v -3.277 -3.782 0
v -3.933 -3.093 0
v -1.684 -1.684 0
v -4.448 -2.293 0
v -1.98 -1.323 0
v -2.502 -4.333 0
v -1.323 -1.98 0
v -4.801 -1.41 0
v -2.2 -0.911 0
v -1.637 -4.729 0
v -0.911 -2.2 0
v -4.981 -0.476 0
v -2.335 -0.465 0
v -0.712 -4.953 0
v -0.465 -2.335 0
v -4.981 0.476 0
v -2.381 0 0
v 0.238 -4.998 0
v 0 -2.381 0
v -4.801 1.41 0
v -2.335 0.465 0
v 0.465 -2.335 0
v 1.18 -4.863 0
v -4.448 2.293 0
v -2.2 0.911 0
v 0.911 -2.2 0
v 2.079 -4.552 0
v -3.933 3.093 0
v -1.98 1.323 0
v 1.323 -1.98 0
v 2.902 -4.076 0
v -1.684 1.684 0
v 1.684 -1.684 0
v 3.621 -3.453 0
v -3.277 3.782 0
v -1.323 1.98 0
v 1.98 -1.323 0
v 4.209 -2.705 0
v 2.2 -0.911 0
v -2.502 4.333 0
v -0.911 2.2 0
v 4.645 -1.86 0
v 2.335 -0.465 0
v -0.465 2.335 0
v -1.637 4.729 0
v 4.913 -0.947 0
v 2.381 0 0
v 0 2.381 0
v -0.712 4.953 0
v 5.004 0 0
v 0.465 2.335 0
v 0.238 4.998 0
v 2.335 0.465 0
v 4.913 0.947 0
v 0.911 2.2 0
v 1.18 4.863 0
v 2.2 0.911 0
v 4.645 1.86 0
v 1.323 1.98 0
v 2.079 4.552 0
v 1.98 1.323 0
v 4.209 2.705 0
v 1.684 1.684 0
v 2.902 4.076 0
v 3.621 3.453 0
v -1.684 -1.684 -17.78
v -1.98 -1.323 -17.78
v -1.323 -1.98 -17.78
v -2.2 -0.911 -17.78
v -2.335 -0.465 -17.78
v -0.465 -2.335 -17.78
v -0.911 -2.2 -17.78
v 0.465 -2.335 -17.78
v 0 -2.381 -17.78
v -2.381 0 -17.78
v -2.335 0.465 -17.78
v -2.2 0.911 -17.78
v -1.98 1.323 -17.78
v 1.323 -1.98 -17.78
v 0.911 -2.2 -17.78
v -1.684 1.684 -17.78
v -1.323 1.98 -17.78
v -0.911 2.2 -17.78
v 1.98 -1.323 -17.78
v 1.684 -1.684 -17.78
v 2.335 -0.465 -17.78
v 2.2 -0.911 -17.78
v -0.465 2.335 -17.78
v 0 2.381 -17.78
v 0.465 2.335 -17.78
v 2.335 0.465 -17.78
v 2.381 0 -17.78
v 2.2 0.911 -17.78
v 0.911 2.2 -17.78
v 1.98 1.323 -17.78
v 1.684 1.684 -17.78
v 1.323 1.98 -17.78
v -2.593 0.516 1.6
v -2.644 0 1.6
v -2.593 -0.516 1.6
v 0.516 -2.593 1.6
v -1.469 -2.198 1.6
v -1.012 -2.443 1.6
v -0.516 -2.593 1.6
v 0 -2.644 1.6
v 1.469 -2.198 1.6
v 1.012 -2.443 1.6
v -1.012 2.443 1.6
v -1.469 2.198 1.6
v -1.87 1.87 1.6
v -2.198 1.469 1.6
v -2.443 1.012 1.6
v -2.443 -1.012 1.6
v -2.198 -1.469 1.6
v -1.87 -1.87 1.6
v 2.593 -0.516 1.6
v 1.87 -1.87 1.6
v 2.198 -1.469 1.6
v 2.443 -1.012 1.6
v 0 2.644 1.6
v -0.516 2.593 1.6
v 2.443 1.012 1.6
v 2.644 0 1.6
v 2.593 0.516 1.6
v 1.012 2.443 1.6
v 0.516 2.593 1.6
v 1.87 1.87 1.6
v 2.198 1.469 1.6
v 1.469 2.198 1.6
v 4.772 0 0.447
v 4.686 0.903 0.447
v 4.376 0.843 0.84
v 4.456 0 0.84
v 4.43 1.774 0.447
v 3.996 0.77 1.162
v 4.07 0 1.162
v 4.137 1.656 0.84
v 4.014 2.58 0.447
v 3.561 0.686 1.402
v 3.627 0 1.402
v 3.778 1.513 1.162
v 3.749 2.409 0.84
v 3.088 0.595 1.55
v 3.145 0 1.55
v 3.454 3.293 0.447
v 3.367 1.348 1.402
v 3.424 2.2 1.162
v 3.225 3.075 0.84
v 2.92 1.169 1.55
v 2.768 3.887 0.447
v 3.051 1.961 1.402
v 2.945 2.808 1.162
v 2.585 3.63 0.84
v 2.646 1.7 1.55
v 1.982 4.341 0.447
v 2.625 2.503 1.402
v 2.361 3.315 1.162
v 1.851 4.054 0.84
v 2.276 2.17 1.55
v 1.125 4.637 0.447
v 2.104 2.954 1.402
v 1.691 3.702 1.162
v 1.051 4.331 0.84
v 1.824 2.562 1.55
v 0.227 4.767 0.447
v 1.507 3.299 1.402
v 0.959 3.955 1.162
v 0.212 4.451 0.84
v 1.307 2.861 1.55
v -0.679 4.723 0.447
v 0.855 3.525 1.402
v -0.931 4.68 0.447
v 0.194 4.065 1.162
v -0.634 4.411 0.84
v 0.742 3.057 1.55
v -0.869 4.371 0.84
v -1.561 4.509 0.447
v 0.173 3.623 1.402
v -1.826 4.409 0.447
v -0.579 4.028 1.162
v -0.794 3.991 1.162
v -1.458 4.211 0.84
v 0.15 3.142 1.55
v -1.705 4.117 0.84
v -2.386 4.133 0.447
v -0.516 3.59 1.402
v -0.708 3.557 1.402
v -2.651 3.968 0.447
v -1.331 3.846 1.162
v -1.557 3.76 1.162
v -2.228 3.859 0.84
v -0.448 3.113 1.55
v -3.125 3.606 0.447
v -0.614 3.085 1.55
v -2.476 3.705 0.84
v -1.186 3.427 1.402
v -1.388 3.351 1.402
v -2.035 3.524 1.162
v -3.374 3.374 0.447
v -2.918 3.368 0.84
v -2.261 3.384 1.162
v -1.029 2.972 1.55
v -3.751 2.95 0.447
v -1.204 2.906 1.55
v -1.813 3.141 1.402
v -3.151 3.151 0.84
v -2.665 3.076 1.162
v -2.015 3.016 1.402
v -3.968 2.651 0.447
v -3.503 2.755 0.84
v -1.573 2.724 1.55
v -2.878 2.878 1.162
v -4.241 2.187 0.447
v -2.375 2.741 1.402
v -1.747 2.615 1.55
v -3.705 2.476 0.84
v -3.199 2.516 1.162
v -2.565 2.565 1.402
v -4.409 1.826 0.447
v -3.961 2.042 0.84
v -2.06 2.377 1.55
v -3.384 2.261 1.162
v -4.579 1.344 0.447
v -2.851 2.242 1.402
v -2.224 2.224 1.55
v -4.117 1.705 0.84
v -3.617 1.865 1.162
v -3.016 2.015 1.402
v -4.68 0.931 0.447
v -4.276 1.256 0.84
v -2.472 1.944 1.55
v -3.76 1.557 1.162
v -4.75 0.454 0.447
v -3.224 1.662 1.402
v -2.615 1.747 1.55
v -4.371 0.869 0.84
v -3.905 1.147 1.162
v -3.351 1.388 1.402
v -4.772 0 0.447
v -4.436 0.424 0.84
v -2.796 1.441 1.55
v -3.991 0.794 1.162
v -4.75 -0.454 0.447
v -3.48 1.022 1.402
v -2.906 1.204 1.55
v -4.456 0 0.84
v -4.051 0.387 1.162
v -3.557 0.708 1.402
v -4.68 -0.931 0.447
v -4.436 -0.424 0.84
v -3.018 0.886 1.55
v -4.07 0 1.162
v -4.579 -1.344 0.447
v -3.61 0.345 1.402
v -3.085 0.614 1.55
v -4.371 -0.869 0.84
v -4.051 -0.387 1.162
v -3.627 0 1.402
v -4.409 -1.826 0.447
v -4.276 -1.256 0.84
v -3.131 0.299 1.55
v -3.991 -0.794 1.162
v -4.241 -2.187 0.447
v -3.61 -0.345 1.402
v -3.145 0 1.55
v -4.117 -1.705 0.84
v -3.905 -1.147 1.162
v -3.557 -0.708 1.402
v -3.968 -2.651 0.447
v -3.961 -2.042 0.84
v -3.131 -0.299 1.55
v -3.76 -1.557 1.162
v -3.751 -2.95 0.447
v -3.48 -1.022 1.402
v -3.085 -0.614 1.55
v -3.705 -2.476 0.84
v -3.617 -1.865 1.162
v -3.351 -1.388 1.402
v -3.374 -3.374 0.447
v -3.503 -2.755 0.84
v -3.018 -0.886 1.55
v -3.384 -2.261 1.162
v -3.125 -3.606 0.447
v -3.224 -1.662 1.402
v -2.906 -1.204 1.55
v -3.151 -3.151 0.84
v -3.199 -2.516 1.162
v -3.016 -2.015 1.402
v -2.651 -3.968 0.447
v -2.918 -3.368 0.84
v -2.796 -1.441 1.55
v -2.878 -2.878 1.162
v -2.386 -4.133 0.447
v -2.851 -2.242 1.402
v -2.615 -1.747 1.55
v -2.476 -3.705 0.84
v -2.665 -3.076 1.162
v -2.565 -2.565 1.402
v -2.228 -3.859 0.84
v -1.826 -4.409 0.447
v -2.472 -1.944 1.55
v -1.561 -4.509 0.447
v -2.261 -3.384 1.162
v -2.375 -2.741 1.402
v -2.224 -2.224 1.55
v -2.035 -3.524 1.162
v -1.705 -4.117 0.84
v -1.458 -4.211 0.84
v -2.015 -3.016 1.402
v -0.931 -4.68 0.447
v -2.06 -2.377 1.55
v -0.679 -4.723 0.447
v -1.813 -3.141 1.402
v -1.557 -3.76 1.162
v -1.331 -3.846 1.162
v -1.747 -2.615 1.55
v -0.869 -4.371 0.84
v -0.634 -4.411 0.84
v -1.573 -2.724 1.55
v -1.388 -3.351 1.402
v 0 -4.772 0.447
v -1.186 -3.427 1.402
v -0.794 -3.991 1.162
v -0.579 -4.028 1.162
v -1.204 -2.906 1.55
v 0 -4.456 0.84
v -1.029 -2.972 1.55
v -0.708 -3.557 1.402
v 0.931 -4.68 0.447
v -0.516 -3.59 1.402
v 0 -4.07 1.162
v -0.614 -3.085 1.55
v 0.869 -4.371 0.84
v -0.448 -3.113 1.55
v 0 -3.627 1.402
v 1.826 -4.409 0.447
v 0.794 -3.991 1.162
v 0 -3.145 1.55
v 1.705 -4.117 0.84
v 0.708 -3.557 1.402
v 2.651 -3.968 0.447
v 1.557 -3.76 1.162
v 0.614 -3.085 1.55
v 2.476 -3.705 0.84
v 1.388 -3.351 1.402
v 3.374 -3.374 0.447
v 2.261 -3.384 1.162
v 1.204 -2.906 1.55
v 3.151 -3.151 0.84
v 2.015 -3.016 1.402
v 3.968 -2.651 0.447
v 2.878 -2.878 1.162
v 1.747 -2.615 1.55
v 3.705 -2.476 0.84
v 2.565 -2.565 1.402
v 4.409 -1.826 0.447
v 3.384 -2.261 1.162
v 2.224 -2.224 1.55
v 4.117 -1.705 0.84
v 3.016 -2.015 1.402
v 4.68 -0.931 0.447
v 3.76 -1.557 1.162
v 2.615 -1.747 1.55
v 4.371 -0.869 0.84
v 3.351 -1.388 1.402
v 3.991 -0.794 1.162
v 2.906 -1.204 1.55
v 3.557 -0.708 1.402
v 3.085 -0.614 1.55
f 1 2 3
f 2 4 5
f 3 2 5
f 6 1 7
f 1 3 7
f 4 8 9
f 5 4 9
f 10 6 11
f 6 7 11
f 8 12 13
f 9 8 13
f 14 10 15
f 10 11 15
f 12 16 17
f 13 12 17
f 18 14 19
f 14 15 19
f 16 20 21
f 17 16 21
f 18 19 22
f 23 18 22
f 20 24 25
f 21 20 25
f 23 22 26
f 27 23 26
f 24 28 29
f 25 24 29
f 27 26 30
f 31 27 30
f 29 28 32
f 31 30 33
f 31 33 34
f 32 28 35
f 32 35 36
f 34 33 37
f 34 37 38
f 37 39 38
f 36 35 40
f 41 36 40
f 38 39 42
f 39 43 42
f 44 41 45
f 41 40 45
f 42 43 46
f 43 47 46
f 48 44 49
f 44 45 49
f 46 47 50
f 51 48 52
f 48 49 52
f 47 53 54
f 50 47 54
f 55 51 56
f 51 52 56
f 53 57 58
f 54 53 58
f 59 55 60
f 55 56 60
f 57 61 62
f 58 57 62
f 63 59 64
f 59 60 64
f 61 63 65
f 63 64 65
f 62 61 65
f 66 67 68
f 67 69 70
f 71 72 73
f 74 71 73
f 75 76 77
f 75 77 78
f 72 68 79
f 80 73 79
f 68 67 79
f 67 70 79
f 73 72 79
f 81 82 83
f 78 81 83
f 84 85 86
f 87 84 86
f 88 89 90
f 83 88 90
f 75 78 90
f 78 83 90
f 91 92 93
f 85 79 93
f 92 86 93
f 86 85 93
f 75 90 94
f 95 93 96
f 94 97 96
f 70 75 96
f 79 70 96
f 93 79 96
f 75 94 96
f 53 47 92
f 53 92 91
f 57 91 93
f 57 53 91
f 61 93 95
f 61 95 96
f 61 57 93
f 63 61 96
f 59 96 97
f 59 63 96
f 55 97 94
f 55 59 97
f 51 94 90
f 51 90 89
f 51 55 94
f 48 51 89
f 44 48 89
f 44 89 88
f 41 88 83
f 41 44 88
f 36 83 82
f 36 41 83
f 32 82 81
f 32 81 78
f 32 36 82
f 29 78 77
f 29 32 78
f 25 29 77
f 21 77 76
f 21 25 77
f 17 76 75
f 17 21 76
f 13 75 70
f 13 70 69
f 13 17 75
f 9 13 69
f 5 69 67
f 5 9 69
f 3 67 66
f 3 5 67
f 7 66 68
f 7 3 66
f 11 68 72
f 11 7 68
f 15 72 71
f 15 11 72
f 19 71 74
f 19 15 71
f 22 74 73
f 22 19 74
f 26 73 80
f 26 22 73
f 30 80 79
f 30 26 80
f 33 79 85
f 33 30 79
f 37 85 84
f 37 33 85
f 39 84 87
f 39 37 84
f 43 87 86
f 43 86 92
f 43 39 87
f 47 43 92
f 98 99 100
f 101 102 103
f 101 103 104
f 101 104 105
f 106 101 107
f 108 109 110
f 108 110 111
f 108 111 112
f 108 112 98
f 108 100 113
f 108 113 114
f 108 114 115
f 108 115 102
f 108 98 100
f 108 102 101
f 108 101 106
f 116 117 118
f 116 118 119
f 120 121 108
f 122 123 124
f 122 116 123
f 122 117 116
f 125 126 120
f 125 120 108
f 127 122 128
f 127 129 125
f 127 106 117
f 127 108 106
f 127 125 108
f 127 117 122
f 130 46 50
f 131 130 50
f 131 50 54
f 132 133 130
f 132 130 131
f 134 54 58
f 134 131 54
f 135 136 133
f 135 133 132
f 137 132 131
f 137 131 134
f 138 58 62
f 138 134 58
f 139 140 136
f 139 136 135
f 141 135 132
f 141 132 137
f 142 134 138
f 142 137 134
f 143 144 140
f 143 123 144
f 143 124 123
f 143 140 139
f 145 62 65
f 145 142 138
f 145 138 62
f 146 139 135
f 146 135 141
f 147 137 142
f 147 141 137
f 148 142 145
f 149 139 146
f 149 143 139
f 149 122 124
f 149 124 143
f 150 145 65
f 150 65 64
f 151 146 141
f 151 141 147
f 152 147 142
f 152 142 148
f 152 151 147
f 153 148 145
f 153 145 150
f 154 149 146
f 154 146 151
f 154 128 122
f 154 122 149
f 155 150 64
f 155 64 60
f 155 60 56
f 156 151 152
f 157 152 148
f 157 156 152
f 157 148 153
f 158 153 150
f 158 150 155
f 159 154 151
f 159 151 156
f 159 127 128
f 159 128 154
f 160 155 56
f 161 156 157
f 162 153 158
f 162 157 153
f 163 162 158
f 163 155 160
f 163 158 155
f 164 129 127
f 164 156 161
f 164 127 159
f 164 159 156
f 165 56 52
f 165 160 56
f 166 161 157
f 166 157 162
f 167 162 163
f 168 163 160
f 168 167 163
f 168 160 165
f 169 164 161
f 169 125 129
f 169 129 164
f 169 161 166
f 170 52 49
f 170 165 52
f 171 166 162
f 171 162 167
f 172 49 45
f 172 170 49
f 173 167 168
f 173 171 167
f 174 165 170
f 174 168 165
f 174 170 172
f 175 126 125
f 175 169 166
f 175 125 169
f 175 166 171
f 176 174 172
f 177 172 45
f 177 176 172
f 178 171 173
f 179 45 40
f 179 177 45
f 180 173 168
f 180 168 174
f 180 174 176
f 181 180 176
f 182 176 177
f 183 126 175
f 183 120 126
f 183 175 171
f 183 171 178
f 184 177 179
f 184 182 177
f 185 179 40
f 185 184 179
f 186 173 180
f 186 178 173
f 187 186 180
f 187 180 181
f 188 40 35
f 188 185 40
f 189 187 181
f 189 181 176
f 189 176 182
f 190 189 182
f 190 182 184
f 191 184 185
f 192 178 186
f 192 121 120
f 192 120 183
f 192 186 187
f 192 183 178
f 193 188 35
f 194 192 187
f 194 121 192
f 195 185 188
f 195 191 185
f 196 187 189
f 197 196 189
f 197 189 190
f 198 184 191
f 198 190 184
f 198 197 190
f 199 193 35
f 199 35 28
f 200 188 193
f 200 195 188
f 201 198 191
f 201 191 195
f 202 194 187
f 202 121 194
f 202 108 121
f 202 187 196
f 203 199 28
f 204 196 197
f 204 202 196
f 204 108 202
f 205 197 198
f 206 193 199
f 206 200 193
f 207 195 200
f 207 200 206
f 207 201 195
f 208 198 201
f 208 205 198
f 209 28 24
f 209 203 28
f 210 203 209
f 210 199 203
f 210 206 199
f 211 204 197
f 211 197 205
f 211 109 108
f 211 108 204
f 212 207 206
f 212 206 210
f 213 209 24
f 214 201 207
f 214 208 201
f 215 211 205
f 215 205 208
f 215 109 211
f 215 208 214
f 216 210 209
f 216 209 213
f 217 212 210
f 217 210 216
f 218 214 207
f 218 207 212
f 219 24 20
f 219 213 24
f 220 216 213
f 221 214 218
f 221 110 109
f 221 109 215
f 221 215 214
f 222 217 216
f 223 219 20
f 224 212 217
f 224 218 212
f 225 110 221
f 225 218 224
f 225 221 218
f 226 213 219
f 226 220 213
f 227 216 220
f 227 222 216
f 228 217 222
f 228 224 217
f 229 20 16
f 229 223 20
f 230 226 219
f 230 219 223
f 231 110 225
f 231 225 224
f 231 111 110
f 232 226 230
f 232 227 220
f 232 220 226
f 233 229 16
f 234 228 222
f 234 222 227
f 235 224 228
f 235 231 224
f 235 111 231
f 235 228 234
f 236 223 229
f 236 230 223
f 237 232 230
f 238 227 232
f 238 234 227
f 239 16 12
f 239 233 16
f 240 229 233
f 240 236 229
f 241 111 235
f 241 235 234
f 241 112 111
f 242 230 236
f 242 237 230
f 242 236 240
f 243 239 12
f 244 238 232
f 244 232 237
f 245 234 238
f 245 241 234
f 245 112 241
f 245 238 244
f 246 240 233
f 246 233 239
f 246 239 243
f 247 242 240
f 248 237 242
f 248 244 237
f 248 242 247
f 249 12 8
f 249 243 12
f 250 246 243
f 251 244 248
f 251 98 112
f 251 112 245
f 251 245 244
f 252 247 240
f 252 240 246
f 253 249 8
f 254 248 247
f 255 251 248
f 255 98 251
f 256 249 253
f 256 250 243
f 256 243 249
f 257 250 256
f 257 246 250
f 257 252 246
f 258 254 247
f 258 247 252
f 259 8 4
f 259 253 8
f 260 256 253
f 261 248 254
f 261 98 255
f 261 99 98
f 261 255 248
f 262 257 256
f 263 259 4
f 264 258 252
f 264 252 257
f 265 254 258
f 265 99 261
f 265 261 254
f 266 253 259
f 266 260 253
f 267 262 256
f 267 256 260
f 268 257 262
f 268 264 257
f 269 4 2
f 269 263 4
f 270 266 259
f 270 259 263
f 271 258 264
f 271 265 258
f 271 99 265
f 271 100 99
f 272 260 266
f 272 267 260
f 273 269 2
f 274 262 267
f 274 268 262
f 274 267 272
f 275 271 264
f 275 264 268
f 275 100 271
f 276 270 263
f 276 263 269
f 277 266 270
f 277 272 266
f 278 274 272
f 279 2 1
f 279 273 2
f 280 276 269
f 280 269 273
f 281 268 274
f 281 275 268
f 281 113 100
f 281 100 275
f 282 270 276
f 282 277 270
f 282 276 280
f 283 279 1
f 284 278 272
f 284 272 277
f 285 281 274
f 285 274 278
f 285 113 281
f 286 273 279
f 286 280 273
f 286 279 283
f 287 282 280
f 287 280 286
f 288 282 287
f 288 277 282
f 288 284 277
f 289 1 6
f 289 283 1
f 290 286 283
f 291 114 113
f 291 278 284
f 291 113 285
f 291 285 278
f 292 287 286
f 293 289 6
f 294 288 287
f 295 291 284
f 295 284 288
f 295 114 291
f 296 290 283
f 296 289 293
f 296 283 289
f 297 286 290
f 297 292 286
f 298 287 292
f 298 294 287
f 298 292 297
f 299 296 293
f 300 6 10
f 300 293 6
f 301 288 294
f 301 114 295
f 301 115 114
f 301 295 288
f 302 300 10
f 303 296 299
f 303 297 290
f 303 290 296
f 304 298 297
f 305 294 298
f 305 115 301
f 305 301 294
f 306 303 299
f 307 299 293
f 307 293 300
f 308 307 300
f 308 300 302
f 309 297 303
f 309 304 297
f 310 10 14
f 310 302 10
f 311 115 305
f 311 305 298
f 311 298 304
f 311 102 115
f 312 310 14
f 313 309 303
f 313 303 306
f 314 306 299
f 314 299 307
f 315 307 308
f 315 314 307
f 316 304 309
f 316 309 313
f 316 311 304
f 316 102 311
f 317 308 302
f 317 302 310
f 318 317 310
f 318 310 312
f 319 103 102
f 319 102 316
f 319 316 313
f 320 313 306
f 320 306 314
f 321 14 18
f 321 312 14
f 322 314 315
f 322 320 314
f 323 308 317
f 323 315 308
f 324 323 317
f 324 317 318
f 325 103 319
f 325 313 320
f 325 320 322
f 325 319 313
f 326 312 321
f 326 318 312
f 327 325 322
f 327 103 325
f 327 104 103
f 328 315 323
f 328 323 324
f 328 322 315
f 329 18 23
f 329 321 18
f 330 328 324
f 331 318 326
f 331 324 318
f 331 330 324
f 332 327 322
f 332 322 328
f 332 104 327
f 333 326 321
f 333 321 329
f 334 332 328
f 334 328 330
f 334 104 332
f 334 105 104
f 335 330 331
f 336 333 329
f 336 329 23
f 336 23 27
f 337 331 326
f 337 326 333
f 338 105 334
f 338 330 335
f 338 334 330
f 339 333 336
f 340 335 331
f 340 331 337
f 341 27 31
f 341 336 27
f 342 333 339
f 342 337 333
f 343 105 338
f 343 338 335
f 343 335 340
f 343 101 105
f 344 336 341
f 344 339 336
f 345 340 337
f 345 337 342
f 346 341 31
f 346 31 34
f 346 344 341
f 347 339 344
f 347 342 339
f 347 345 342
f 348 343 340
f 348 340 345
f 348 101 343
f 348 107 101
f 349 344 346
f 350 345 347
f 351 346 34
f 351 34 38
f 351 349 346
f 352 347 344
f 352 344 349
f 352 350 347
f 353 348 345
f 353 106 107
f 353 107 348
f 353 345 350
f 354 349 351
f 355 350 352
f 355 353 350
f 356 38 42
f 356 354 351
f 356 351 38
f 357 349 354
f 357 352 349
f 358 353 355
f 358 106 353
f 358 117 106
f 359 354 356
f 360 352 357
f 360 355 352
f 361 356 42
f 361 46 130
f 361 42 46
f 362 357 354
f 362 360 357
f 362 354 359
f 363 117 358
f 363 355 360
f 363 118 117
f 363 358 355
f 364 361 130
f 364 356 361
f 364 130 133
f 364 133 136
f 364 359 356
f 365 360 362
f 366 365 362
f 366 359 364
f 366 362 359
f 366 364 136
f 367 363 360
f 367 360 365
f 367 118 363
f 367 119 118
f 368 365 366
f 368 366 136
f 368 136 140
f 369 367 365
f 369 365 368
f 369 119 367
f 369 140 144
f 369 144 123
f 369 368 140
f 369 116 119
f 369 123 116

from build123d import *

# Parameters (mm, degrees)
SKETCH1_R           = 5.0038
BOSS_EXTRUDE1_DEPTH = 1.6002
SKETCH2_R           = 2.38125
BOSS_EXTRUDE2_DEPTH = 17.78
FILLET1_R           = 2.54


with BuildPart() as part:
    # Sketch1 → Boss-Extrude1 (new body)
    with BuildSketch(Plane.XY):
        Circle(SKETCH1_R)
    extrude(amount=BOSS_EXTRUDE1_DEPTH)

    # Sketch2 → Boss-Extrude2 (add)
    with BuildSketch(Plane.XY):
        Circle(SKETCH2_R)
    extrude(amount=-BOSS_EXTRUDE2_DEPTH)

    # Fillet1
    # the kernel refuses this fillet: 2.54 mm, written as the material it takes off along each edge
    with BuildSketch(Plane(origin=(0, 0, 1.6002), x_dir=(1, 0, 0), z_dir=(0, -1, 0))) as fillet1_piece_1:
        with BuildLine():
            CenterArc((2.644059345, -2.54), FILLET1_R, 21.715617283, 68.284382717)
            Line((2.644059345, 0), (2.644059345, 0.0508))
            Line((2.644059345, 0.0508), (5.0038, 0.0508))
            Line((5.0038, 0.0508), (5.0546, 0))
            ThreePointArc((5.0546, 0), (5.0546, -0.8001), (5.050994813, -1.581404))
            Line((5.050994813, -1.581404), (5.0038, -1.6002))
        make_face()
    revolve(axis=Axis((0, 0, 1.6002), (0, 0, 1)), mode=Mode.SUBTRACT)


solid = part.part
